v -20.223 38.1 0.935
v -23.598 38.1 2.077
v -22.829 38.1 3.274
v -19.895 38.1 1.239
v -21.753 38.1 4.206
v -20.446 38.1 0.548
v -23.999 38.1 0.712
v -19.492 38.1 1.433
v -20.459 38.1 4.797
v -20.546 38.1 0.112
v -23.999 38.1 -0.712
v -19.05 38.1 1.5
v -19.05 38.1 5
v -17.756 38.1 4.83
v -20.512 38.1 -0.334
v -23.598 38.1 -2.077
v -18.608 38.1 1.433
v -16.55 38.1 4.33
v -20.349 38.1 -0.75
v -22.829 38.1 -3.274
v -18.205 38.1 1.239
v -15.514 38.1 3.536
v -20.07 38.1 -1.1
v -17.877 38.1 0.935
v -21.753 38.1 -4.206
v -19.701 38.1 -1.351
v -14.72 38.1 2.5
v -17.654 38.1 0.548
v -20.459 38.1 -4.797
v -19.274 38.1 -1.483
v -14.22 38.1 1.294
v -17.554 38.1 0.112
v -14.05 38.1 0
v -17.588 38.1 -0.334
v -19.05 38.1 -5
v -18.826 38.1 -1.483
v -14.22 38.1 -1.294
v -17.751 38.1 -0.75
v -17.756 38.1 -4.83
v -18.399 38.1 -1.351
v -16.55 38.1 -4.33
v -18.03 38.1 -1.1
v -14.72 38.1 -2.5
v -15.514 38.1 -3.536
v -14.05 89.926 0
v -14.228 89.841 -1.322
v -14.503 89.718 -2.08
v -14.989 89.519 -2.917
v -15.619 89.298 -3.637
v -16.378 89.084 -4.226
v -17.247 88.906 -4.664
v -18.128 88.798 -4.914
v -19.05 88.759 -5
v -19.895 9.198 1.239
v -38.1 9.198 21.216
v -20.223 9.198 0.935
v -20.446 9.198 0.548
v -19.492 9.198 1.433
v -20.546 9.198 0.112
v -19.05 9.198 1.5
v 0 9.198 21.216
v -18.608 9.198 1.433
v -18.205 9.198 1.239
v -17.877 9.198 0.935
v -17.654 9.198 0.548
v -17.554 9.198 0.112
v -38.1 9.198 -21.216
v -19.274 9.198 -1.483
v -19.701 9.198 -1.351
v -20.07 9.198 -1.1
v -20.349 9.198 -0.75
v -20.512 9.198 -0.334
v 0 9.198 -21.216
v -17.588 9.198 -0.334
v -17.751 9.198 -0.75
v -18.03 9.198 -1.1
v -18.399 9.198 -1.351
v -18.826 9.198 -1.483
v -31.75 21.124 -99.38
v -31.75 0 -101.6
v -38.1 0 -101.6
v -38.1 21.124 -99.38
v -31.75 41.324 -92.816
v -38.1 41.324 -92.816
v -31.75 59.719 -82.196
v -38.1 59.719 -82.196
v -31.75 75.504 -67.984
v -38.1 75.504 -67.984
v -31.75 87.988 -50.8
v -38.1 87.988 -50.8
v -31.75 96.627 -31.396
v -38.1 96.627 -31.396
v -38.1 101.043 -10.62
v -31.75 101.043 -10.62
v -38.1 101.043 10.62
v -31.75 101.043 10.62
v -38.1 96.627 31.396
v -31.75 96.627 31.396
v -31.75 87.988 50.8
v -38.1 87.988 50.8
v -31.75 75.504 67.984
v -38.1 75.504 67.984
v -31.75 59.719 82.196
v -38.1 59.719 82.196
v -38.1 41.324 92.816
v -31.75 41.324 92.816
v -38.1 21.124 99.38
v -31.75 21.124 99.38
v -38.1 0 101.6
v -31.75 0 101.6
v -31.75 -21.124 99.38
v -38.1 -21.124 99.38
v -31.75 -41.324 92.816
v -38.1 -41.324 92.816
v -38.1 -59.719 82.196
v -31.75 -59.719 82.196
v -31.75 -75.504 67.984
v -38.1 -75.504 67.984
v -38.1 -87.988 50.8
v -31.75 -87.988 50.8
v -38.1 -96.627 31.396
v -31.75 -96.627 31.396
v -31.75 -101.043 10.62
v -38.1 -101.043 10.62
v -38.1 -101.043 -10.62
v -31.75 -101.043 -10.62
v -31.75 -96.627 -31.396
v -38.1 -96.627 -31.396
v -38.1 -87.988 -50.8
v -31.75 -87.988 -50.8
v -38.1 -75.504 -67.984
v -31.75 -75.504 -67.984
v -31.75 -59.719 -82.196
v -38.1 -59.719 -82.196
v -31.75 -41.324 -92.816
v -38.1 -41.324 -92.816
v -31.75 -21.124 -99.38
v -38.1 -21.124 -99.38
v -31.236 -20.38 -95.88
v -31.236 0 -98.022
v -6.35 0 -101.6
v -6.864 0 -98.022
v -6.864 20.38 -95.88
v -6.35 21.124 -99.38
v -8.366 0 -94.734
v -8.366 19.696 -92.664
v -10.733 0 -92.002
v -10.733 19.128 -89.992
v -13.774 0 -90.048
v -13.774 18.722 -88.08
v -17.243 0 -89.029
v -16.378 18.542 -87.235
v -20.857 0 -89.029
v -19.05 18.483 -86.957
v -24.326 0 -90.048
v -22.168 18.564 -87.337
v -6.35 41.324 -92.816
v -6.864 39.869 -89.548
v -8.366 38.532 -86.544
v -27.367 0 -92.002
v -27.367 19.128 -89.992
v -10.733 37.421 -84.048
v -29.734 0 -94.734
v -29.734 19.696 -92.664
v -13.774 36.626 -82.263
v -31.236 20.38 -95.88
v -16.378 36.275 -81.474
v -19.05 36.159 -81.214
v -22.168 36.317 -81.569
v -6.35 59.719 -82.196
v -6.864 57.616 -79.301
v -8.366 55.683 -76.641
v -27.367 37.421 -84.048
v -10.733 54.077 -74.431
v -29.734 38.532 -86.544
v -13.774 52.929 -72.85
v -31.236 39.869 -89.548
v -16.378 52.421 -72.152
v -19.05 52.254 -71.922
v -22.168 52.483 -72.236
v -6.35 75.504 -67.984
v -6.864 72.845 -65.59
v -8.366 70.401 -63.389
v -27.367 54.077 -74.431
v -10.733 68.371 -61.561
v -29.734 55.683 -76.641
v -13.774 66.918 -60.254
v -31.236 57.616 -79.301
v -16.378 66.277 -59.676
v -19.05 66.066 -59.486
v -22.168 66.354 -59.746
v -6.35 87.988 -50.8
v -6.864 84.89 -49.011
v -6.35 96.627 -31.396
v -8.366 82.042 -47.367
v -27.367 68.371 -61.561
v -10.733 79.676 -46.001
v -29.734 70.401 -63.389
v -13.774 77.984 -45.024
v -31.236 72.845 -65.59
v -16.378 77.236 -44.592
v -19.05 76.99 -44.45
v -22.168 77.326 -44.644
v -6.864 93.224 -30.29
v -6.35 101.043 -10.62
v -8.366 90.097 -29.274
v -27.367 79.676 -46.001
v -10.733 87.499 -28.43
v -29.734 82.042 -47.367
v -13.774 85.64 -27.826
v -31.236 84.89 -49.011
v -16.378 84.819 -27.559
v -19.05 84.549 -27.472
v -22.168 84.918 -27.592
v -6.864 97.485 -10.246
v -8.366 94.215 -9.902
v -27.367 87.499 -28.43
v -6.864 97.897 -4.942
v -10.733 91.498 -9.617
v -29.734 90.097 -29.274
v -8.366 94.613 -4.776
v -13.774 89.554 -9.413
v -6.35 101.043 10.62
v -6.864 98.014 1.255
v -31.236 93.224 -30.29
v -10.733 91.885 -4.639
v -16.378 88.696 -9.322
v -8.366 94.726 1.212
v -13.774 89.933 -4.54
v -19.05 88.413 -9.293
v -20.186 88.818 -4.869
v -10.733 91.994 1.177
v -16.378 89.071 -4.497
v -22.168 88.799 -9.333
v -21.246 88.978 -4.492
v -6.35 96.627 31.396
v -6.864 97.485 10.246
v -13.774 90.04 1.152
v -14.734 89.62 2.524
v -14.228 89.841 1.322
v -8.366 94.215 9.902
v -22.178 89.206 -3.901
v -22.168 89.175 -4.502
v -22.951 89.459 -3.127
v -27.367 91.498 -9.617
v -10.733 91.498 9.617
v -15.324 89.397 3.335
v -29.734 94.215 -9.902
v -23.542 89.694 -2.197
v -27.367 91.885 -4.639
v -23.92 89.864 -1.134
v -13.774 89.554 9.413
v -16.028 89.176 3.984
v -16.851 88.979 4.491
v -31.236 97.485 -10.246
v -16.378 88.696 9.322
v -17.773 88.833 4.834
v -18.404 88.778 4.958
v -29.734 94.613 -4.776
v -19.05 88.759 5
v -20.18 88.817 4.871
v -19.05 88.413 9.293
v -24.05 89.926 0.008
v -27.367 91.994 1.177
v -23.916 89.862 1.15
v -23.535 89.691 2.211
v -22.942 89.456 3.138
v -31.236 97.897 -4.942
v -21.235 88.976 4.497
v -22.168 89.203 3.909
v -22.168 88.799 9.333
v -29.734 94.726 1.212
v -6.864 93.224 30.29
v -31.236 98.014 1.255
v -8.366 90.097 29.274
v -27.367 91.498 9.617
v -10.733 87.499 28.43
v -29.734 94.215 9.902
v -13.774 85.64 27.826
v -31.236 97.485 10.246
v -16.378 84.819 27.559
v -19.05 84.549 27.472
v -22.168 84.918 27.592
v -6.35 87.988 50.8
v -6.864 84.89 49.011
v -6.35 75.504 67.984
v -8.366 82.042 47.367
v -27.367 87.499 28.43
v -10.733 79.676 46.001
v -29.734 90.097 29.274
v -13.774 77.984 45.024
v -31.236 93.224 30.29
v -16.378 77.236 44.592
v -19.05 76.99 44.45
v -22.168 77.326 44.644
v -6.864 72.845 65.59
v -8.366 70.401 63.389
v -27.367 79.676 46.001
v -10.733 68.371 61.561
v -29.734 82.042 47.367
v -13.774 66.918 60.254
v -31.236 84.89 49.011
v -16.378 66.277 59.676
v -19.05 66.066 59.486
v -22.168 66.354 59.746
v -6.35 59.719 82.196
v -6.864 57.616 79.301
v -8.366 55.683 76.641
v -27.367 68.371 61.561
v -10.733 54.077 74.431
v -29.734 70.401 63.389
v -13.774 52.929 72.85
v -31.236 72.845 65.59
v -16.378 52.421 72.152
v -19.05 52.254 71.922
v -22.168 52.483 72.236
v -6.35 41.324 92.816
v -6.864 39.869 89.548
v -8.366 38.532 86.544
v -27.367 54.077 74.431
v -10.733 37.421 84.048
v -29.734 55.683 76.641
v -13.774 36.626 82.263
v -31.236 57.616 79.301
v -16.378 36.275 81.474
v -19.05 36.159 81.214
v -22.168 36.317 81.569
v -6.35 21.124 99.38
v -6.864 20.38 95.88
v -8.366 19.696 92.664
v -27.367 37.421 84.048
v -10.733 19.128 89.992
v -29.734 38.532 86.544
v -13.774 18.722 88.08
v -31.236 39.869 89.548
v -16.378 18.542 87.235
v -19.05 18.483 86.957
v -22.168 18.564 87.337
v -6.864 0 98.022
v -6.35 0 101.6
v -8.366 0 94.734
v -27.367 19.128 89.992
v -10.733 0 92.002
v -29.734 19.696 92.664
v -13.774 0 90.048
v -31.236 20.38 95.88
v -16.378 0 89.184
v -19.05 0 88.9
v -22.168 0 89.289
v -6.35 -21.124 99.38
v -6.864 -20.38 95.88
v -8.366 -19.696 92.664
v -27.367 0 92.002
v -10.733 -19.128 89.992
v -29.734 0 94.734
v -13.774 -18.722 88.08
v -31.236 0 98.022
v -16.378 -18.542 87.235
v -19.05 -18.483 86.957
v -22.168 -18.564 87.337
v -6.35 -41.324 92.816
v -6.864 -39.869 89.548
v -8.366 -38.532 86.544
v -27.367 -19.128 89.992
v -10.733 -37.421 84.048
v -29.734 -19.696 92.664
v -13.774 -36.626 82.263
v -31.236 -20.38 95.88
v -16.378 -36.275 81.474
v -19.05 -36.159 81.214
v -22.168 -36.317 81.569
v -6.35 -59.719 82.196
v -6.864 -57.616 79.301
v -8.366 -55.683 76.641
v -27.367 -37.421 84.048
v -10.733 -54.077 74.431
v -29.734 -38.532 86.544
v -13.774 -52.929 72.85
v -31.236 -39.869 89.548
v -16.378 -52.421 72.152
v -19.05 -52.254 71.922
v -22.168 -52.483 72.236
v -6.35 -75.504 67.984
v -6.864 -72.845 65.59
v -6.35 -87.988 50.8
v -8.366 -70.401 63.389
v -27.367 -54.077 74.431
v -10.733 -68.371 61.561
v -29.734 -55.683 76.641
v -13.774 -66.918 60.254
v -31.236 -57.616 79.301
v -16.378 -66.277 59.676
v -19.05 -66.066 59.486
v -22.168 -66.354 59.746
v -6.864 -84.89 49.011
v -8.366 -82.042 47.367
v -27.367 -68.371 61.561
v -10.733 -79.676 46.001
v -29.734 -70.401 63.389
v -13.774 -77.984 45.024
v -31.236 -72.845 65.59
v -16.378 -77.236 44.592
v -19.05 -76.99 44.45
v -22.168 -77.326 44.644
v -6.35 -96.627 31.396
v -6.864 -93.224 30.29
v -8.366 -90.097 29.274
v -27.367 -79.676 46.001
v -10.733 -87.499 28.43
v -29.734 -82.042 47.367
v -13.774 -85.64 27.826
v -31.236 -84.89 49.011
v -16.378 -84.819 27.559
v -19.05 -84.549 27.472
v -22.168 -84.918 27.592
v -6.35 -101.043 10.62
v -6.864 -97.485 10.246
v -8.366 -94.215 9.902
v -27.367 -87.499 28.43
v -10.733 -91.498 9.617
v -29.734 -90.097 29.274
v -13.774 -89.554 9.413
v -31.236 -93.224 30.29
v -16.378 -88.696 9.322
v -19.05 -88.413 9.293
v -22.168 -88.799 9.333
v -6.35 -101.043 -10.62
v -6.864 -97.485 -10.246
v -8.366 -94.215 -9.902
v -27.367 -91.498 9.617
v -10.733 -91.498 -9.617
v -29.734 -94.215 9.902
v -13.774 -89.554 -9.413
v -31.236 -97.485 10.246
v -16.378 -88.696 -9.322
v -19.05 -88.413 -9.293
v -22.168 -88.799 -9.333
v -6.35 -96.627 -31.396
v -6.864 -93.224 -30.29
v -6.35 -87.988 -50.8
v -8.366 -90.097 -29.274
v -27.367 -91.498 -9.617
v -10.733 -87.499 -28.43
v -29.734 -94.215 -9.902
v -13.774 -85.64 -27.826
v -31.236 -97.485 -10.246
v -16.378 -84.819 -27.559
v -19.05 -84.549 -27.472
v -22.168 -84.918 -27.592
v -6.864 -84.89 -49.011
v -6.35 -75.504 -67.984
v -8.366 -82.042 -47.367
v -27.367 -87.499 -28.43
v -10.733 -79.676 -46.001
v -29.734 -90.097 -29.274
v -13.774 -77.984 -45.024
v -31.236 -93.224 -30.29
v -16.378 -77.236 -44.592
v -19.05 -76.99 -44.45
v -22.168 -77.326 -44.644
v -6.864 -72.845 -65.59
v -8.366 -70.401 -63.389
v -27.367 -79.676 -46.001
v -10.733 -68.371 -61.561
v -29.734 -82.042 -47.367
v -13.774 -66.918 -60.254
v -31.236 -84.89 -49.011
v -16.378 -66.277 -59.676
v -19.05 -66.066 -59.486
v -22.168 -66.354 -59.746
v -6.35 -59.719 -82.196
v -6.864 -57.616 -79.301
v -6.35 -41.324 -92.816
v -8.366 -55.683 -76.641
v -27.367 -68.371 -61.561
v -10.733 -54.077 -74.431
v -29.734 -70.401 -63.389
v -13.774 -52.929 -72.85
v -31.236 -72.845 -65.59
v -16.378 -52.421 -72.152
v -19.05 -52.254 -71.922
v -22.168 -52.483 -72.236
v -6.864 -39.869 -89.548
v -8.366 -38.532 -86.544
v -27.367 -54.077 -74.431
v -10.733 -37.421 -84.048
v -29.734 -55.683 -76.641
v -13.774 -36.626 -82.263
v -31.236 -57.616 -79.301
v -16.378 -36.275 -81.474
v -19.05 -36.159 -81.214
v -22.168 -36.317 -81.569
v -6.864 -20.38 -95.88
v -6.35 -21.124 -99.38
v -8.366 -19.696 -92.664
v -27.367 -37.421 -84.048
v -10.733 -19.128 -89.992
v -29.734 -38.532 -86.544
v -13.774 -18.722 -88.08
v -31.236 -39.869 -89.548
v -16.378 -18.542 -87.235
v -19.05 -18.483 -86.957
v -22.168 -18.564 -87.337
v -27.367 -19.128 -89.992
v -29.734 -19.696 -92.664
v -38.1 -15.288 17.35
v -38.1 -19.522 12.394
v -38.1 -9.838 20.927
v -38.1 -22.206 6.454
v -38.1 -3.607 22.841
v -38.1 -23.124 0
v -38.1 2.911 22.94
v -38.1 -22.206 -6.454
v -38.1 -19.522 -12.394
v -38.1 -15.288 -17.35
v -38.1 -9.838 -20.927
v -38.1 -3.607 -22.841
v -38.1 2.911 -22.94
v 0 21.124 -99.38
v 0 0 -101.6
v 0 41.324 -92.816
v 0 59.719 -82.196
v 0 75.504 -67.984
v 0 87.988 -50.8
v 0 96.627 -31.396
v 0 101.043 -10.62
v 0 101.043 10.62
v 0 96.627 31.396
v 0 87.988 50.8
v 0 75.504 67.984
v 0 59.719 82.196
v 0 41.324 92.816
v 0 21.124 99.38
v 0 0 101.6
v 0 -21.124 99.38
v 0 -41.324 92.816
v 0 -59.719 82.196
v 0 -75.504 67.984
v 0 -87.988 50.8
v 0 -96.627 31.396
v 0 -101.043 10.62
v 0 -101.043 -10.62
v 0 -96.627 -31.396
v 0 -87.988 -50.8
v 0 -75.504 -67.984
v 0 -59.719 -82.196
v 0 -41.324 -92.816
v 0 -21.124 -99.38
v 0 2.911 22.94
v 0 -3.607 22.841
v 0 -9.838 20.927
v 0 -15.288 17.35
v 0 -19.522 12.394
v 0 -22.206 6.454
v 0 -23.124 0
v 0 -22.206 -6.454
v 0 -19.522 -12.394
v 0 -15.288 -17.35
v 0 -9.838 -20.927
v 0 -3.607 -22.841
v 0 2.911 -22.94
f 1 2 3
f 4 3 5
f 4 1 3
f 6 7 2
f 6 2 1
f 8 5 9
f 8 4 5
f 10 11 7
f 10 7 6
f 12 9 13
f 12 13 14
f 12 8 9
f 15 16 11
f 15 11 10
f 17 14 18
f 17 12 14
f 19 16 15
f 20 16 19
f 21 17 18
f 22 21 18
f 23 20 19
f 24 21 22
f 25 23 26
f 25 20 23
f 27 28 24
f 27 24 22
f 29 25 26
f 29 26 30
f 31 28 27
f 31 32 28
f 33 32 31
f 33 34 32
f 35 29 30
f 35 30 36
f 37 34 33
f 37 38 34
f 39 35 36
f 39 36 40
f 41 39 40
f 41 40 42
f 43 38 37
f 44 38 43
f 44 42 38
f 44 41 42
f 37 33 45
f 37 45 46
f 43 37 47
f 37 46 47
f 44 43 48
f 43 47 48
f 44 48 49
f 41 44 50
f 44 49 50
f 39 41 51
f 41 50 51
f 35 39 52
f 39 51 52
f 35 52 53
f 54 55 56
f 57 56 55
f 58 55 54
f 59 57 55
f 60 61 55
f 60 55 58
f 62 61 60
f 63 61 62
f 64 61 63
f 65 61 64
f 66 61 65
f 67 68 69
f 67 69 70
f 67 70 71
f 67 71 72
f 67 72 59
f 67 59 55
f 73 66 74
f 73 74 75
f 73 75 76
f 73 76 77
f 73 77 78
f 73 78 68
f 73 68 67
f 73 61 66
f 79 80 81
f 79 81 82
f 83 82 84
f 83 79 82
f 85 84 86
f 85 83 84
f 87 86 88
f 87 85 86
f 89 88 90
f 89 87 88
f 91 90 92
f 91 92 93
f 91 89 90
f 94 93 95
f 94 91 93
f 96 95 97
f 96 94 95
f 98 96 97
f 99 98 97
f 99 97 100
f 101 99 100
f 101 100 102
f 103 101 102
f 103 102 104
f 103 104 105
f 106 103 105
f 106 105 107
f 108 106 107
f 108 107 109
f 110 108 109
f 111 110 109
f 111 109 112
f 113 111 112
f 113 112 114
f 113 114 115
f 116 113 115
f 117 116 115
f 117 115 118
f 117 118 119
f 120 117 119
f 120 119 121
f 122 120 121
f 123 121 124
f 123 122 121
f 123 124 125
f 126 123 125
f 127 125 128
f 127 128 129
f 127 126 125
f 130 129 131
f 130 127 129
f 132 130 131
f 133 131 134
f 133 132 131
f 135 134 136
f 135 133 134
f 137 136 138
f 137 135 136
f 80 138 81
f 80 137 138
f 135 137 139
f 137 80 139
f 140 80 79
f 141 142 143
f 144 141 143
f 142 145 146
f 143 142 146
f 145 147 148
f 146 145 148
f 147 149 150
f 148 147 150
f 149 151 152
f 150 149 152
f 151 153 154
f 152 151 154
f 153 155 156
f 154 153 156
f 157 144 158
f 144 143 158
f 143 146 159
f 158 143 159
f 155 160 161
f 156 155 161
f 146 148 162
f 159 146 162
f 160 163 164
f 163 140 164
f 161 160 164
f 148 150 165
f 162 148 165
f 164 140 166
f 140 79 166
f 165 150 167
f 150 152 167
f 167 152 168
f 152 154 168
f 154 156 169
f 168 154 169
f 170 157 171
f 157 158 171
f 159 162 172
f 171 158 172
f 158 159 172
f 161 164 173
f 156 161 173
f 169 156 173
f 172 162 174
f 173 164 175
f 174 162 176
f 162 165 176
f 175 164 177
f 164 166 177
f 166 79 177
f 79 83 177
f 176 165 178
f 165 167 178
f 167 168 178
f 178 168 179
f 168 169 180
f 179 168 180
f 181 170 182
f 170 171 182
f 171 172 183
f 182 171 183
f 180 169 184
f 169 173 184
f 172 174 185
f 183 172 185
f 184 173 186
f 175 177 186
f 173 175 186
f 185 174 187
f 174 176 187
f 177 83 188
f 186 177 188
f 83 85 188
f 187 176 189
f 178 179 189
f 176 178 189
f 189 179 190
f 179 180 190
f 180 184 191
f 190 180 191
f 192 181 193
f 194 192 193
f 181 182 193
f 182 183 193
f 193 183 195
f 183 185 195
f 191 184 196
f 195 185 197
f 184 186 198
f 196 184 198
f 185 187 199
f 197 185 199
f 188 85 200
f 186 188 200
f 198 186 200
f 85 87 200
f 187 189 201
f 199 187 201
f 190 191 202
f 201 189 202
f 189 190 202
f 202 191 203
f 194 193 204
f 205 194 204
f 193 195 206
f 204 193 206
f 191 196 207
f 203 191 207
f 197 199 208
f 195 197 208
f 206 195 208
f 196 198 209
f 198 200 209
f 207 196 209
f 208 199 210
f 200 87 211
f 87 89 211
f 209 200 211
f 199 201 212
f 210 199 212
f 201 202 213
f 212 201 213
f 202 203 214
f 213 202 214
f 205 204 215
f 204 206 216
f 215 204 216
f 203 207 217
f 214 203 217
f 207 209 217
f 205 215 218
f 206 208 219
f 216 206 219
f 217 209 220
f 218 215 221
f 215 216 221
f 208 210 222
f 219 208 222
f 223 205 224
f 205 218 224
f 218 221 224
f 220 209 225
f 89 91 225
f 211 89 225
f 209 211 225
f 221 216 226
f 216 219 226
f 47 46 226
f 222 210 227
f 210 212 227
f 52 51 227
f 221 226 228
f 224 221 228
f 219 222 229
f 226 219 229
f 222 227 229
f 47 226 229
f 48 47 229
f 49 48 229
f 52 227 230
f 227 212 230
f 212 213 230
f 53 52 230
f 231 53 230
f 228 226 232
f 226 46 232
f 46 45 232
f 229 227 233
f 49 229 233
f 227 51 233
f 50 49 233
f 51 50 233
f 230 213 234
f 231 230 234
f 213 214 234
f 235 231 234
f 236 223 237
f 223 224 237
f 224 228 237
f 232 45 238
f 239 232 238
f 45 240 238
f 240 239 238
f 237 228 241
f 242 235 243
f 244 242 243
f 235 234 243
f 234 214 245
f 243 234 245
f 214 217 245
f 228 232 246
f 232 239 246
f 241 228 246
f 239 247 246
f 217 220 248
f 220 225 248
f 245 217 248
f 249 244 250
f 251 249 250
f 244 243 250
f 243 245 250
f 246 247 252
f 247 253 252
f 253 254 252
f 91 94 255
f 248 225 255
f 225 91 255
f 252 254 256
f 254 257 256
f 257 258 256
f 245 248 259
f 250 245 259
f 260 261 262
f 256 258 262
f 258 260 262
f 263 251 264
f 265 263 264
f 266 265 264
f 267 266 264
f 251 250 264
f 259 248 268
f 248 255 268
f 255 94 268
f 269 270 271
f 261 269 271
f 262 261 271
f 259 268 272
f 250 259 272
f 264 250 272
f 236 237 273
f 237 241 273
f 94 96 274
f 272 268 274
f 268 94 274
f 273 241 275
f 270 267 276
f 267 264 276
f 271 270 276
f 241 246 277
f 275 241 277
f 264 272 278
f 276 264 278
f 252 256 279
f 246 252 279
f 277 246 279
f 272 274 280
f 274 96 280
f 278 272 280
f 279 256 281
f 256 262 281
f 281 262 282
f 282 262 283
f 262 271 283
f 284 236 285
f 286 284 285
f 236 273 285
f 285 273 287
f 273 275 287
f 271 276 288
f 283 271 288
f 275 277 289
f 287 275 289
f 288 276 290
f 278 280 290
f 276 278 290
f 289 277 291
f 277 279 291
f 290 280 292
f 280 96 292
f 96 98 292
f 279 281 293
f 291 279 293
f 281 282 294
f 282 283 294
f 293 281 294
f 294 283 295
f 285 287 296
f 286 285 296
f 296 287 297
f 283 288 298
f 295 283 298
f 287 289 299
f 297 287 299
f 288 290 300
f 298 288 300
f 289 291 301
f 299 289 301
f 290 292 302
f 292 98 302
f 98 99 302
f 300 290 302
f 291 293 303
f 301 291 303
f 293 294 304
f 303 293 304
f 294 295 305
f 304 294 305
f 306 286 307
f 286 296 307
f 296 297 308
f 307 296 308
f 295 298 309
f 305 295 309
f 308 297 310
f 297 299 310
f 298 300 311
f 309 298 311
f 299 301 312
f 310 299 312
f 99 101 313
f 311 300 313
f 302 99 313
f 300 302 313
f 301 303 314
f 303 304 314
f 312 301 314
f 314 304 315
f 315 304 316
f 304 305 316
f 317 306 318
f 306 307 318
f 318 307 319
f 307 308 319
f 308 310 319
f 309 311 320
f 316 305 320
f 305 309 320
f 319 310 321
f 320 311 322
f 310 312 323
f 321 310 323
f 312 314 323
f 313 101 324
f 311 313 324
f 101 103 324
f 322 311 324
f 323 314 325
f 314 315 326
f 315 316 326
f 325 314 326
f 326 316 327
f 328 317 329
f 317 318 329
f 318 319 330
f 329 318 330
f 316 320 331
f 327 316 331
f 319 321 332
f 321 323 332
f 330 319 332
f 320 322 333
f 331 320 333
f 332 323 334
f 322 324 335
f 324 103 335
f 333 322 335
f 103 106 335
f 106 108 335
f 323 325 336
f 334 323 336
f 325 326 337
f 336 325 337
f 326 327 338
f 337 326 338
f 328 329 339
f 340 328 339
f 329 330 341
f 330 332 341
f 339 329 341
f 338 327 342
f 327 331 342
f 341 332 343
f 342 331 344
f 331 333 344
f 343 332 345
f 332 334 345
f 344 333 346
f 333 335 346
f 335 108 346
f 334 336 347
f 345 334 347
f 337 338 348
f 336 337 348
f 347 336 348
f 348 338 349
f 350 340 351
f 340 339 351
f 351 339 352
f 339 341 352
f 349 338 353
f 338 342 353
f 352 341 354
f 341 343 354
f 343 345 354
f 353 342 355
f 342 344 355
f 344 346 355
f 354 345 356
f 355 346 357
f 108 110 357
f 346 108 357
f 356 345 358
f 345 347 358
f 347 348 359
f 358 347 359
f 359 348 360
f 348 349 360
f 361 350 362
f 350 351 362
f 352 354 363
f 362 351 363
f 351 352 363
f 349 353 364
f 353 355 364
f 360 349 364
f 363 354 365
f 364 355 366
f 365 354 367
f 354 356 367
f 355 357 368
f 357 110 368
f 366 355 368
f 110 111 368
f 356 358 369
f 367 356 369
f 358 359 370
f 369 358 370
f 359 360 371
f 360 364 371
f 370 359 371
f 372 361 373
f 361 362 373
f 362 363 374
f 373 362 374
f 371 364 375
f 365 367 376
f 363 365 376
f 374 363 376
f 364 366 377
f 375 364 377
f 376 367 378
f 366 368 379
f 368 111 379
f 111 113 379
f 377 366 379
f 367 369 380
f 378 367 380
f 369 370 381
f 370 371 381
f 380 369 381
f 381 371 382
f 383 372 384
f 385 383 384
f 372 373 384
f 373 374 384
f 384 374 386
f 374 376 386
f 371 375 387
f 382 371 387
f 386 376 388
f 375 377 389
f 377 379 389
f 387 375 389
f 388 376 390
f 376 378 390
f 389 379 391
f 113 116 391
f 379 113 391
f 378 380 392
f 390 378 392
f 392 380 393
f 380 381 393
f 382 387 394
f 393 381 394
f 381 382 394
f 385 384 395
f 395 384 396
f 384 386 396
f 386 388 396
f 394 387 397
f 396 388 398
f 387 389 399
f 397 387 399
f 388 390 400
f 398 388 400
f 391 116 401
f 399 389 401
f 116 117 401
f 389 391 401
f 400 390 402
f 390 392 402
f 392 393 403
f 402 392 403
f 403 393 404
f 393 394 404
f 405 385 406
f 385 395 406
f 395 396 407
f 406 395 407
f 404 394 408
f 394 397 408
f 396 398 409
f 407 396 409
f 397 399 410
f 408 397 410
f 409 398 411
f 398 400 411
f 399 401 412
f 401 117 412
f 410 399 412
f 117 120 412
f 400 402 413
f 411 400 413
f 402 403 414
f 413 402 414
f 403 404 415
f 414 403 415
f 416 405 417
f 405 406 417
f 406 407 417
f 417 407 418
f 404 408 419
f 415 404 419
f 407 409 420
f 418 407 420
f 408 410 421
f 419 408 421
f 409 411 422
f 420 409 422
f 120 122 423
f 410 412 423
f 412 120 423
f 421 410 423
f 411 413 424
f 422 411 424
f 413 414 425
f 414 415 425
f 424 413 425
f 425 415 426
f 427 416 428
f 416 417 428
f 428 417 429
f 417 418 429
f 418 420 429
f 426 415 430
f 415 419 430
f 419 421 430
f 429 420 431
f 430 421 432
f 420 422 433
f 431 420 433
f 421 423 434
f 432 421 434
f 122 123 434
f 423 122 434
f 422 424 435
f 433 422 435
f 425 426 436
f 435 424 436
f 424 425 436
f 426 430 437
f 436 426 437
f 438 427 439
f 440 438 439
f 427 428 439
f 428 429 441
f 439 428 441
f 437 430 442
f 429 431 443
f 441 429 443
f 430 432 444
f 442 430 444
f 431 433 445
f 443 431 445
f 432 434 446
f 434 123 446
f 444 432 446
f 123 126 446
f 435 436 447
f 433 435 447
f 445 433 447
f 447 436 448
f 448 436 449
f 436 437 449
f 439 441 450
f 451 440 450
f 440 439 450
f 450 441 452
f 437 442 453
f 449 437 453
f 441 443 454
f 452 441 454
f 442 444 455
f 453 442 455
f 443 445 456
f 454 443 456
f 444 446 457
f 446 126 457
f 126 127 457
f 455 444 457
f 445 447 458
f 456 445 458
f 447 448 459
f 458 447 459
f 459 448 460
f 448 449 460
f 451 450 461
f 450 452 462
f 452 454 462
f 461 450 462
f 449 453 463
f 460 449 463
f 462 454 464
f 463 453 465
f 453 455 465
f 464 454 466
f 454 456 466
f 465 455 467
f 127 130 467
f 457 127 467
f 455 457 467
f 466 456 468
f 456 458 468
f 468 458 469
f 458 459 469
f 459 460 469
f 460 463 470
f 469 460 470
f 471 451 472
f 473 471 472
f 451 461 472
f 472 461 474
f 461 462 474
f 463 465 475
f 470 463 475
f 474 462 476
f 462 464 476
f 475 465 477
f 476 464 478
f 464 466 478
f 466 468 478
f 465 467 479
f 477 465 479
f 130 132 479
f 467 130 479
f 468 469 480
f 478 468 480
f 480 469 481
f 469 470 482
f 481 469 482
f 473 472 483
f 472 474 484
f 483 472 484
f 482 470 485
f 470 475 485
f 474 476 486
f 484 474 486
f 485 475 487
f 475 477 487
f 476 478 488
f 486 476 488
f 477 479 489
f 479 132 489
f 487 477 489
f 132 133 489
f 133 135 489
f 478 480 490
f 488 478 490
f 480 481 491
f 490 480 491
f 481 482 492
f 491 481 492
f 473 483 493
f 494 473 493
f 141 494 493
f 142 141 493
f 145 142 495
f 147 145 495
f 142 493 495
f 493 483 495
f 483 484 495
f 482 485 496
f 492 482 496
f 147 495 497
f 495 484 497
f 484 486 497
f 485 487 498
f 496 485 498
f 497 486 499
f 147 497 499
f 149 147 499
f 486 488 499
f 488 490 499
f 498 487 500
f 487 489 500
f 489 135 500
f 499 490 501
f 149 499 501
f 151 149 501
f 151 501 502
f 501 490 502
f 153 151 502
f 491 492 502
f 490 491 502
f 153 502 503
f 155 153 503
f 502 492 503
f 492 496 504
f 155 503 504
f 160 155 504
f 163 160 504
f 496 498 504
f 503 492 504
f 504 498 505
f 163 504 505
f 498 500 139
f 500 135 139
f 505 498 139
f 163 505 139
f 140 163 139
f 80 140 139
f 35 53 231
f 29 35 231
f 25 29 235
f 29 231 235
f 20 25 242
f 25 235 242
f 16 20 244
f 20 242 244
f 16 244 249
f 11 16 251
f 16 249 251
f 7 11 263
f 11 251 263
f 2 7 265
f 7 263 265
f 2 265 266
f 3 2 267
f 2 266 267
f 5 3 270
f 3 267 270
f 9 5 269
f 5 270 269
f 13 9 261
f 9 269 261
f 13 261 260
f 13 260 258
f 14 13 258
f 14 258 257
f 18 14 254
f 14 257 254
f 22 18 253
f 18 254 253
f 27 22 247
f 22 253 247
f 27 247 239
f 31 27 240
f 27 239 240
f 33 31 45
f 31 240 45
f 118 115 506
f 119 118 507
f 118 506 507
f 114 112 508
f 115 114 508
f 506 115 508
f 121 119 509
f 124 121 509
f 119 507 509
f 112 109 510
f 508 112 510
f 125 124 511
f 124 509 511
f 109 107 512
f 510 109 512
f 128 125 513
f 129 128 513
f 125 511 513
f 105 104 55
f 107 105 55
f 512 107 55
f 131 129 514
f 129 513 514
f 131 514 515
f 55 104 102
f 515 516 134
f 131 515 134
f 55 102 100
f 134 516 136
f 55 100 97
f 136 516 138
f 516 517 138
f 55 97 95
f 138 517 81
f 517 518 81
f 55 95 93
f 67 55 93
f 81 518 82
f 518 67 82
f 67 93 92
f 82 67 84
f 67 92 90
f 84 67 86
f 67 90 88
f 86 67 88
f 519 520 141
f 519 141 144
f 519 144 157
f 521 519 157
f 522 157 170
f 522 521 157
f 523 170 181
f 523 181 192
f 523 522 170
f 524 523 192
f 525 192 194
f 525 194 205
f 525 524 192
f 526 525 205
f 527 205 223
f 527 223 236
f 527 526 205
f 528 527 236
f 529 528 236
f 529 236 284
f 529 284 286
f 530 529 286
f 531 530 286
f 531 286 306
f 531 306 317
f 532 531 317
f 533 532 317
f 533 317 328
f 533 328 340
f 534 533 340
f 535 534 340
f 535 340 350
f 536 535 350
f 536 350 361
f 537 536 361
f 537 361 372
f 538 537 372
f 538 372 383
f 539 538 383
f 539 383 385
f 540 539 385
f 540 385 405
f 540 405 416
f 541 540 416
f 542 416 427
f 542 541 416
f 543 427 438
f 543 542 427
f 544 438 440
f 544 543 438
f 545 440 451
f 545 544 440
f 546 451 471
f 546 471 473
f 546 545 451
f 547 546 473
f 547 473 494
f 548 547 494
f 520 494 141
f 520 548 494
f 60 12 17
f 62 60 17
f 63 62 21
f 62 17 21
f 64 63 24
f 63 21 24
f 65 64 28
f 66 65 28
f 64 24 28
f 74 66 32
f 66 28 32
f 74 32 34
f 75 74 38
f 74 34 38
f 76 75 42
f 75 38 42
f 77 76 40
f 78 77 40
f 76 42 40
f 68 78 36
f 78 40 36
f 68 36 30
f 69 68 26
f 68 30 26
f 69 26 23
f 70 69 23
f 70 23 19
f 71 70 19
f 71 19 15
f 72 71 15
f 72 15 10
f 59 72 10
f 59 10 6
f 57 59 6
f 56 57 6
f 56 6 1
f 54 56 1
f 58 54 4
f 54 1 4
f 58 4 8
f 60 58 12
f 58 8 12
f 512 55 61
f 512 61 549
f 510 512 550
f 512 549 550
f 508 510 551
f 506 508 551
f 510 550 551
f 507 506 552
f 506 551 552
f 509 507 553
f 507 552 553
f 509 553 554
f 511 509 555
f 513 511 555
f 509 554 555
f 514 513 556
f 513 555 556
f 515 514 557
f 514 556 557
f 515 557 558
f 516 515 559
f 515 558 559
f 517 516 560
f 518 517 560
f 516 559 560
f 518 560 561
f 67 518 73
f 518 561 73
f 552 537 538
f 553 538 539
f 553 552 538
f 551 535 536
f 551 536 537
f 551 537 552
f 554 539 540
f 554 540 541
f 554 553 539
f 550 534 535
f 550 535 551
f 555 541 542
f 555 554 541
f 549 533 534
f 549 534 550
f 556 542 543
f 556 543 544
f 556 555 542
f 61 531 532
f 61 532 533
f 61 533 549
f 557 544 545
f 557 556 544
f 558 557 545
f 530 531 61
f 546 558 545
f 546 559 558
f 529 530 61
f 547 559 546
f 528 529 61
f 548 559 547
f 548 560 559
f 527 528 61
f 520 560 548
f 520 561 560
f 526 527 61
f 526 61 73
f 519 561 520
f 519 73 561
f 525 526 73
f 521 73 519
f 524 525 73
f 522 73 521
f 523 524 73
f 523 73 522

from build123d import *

# Parameters (mm, degrees)
SKETCH1_R           = 101.6
SKETCH1_R_2         = 23.124366549
BOSS_EXTRUDE1_DEPTH = 38.1
CUT_EXTRUDE1_DEPTH  = 63.5
SKETCH3_R           = 1.5
CUT_EXTRUDE4_DEPTH  = 28.902215931
SKETCH4_R           = 12.7


with BuildPart() as part:
    # Sketch1 → Boss-Extrude1 (new body)
    # profile 1 of 2: a face of its own
    with BuildSketch(Plane(origin=(0, 0, 0), x_dir=(0, 0, -1), z_dir=(1, 0, 0))):
        Circle(SKETCH1_R)
        Circle(SKETCH1_R_2, mode=Mode.SUBTRACT)
    # profile 2 of 2: a face of its own
    with BuildSketch(Plane(origin=(0, 0, 0), x_dir=(0, 0, -1), z_dir=(1, 0, 0))):
        with BuildLine():
            ThreePointArc((21.216434585, 9.197784069), (0, 23.124366549), (-21.216434585, 9.197784069))
            Line((-21.216434585, 9.197784069), (0, 9.197784069))
            Line((0, 9.197784069), (21.216434585, 9.197784069))
        make_face()
    extrude(amount=-BOSS_EXTRUDE1_DEPTH)

    # Sketch2 → Cut-Extrude1 (cut)
    with BuildSketch(Plane(origin=(0, 101.6, 0), x_dir=(1, 0, 0), z_dir=(0, 1, 0))):
        with BuildLine():
            ThreePointArc((-14.05, 0), (-15.514466094, 3.535533906), (-19.05, 5))
            Line((-19.05, 5), (-19.05, -5))
            ThreePointArc((-19.05, -5), (-15.514466094, -3.535533906), (-14.05, 0))
        make_face()
        with BuildLine():
            Line((-19.05, -5), (-19.05, 5))
            ThreePointArc((-19.05, 5), (-24.05, 0), (-19.05, -5))
        make_face()
    extrude(amount=-CUT_EXTRUDE1_DEPTH, mode=Mode.SUBTRACT)

    # Sketch3 → Cut-Extrude4 (cut)
    with BuildSketch(Plane(origin=(0, 38.1, 0), x_dir=(1, 0, 0), z_dir=(0, 1, 0))):
        with Locations(Location((-19.05, 0, 0), (0, 0, 270))):
            Circle(SKETCH3_R)
    extrude(amount=-CUT_EXTRUDE4_DEPTH, mode=Mode.SUBTRACT)

    # Sketch4 → Cut-Revolve1 (revolve, cut)
    with BuildSketch(Plane(origin=(0, 0, 0), x_dir=(1, 0, 0), z_dir=(0, 1, 0)), mode=Mode.PRIVATE) as cut_revolve1_sk:
        with Locations((-19.05, -101.6)):
            Circle(SKETCH4_R)
    revolve(cut_revolve1_sk.sketch.rotate(Axis((-18.38763681, 0, 0), (1, 0, 0)), 180), axis=Axis((-18.38763681, 0, 0), (1, 0, 0)), mode=Mode.SUBTRACT)


solid = part.part
